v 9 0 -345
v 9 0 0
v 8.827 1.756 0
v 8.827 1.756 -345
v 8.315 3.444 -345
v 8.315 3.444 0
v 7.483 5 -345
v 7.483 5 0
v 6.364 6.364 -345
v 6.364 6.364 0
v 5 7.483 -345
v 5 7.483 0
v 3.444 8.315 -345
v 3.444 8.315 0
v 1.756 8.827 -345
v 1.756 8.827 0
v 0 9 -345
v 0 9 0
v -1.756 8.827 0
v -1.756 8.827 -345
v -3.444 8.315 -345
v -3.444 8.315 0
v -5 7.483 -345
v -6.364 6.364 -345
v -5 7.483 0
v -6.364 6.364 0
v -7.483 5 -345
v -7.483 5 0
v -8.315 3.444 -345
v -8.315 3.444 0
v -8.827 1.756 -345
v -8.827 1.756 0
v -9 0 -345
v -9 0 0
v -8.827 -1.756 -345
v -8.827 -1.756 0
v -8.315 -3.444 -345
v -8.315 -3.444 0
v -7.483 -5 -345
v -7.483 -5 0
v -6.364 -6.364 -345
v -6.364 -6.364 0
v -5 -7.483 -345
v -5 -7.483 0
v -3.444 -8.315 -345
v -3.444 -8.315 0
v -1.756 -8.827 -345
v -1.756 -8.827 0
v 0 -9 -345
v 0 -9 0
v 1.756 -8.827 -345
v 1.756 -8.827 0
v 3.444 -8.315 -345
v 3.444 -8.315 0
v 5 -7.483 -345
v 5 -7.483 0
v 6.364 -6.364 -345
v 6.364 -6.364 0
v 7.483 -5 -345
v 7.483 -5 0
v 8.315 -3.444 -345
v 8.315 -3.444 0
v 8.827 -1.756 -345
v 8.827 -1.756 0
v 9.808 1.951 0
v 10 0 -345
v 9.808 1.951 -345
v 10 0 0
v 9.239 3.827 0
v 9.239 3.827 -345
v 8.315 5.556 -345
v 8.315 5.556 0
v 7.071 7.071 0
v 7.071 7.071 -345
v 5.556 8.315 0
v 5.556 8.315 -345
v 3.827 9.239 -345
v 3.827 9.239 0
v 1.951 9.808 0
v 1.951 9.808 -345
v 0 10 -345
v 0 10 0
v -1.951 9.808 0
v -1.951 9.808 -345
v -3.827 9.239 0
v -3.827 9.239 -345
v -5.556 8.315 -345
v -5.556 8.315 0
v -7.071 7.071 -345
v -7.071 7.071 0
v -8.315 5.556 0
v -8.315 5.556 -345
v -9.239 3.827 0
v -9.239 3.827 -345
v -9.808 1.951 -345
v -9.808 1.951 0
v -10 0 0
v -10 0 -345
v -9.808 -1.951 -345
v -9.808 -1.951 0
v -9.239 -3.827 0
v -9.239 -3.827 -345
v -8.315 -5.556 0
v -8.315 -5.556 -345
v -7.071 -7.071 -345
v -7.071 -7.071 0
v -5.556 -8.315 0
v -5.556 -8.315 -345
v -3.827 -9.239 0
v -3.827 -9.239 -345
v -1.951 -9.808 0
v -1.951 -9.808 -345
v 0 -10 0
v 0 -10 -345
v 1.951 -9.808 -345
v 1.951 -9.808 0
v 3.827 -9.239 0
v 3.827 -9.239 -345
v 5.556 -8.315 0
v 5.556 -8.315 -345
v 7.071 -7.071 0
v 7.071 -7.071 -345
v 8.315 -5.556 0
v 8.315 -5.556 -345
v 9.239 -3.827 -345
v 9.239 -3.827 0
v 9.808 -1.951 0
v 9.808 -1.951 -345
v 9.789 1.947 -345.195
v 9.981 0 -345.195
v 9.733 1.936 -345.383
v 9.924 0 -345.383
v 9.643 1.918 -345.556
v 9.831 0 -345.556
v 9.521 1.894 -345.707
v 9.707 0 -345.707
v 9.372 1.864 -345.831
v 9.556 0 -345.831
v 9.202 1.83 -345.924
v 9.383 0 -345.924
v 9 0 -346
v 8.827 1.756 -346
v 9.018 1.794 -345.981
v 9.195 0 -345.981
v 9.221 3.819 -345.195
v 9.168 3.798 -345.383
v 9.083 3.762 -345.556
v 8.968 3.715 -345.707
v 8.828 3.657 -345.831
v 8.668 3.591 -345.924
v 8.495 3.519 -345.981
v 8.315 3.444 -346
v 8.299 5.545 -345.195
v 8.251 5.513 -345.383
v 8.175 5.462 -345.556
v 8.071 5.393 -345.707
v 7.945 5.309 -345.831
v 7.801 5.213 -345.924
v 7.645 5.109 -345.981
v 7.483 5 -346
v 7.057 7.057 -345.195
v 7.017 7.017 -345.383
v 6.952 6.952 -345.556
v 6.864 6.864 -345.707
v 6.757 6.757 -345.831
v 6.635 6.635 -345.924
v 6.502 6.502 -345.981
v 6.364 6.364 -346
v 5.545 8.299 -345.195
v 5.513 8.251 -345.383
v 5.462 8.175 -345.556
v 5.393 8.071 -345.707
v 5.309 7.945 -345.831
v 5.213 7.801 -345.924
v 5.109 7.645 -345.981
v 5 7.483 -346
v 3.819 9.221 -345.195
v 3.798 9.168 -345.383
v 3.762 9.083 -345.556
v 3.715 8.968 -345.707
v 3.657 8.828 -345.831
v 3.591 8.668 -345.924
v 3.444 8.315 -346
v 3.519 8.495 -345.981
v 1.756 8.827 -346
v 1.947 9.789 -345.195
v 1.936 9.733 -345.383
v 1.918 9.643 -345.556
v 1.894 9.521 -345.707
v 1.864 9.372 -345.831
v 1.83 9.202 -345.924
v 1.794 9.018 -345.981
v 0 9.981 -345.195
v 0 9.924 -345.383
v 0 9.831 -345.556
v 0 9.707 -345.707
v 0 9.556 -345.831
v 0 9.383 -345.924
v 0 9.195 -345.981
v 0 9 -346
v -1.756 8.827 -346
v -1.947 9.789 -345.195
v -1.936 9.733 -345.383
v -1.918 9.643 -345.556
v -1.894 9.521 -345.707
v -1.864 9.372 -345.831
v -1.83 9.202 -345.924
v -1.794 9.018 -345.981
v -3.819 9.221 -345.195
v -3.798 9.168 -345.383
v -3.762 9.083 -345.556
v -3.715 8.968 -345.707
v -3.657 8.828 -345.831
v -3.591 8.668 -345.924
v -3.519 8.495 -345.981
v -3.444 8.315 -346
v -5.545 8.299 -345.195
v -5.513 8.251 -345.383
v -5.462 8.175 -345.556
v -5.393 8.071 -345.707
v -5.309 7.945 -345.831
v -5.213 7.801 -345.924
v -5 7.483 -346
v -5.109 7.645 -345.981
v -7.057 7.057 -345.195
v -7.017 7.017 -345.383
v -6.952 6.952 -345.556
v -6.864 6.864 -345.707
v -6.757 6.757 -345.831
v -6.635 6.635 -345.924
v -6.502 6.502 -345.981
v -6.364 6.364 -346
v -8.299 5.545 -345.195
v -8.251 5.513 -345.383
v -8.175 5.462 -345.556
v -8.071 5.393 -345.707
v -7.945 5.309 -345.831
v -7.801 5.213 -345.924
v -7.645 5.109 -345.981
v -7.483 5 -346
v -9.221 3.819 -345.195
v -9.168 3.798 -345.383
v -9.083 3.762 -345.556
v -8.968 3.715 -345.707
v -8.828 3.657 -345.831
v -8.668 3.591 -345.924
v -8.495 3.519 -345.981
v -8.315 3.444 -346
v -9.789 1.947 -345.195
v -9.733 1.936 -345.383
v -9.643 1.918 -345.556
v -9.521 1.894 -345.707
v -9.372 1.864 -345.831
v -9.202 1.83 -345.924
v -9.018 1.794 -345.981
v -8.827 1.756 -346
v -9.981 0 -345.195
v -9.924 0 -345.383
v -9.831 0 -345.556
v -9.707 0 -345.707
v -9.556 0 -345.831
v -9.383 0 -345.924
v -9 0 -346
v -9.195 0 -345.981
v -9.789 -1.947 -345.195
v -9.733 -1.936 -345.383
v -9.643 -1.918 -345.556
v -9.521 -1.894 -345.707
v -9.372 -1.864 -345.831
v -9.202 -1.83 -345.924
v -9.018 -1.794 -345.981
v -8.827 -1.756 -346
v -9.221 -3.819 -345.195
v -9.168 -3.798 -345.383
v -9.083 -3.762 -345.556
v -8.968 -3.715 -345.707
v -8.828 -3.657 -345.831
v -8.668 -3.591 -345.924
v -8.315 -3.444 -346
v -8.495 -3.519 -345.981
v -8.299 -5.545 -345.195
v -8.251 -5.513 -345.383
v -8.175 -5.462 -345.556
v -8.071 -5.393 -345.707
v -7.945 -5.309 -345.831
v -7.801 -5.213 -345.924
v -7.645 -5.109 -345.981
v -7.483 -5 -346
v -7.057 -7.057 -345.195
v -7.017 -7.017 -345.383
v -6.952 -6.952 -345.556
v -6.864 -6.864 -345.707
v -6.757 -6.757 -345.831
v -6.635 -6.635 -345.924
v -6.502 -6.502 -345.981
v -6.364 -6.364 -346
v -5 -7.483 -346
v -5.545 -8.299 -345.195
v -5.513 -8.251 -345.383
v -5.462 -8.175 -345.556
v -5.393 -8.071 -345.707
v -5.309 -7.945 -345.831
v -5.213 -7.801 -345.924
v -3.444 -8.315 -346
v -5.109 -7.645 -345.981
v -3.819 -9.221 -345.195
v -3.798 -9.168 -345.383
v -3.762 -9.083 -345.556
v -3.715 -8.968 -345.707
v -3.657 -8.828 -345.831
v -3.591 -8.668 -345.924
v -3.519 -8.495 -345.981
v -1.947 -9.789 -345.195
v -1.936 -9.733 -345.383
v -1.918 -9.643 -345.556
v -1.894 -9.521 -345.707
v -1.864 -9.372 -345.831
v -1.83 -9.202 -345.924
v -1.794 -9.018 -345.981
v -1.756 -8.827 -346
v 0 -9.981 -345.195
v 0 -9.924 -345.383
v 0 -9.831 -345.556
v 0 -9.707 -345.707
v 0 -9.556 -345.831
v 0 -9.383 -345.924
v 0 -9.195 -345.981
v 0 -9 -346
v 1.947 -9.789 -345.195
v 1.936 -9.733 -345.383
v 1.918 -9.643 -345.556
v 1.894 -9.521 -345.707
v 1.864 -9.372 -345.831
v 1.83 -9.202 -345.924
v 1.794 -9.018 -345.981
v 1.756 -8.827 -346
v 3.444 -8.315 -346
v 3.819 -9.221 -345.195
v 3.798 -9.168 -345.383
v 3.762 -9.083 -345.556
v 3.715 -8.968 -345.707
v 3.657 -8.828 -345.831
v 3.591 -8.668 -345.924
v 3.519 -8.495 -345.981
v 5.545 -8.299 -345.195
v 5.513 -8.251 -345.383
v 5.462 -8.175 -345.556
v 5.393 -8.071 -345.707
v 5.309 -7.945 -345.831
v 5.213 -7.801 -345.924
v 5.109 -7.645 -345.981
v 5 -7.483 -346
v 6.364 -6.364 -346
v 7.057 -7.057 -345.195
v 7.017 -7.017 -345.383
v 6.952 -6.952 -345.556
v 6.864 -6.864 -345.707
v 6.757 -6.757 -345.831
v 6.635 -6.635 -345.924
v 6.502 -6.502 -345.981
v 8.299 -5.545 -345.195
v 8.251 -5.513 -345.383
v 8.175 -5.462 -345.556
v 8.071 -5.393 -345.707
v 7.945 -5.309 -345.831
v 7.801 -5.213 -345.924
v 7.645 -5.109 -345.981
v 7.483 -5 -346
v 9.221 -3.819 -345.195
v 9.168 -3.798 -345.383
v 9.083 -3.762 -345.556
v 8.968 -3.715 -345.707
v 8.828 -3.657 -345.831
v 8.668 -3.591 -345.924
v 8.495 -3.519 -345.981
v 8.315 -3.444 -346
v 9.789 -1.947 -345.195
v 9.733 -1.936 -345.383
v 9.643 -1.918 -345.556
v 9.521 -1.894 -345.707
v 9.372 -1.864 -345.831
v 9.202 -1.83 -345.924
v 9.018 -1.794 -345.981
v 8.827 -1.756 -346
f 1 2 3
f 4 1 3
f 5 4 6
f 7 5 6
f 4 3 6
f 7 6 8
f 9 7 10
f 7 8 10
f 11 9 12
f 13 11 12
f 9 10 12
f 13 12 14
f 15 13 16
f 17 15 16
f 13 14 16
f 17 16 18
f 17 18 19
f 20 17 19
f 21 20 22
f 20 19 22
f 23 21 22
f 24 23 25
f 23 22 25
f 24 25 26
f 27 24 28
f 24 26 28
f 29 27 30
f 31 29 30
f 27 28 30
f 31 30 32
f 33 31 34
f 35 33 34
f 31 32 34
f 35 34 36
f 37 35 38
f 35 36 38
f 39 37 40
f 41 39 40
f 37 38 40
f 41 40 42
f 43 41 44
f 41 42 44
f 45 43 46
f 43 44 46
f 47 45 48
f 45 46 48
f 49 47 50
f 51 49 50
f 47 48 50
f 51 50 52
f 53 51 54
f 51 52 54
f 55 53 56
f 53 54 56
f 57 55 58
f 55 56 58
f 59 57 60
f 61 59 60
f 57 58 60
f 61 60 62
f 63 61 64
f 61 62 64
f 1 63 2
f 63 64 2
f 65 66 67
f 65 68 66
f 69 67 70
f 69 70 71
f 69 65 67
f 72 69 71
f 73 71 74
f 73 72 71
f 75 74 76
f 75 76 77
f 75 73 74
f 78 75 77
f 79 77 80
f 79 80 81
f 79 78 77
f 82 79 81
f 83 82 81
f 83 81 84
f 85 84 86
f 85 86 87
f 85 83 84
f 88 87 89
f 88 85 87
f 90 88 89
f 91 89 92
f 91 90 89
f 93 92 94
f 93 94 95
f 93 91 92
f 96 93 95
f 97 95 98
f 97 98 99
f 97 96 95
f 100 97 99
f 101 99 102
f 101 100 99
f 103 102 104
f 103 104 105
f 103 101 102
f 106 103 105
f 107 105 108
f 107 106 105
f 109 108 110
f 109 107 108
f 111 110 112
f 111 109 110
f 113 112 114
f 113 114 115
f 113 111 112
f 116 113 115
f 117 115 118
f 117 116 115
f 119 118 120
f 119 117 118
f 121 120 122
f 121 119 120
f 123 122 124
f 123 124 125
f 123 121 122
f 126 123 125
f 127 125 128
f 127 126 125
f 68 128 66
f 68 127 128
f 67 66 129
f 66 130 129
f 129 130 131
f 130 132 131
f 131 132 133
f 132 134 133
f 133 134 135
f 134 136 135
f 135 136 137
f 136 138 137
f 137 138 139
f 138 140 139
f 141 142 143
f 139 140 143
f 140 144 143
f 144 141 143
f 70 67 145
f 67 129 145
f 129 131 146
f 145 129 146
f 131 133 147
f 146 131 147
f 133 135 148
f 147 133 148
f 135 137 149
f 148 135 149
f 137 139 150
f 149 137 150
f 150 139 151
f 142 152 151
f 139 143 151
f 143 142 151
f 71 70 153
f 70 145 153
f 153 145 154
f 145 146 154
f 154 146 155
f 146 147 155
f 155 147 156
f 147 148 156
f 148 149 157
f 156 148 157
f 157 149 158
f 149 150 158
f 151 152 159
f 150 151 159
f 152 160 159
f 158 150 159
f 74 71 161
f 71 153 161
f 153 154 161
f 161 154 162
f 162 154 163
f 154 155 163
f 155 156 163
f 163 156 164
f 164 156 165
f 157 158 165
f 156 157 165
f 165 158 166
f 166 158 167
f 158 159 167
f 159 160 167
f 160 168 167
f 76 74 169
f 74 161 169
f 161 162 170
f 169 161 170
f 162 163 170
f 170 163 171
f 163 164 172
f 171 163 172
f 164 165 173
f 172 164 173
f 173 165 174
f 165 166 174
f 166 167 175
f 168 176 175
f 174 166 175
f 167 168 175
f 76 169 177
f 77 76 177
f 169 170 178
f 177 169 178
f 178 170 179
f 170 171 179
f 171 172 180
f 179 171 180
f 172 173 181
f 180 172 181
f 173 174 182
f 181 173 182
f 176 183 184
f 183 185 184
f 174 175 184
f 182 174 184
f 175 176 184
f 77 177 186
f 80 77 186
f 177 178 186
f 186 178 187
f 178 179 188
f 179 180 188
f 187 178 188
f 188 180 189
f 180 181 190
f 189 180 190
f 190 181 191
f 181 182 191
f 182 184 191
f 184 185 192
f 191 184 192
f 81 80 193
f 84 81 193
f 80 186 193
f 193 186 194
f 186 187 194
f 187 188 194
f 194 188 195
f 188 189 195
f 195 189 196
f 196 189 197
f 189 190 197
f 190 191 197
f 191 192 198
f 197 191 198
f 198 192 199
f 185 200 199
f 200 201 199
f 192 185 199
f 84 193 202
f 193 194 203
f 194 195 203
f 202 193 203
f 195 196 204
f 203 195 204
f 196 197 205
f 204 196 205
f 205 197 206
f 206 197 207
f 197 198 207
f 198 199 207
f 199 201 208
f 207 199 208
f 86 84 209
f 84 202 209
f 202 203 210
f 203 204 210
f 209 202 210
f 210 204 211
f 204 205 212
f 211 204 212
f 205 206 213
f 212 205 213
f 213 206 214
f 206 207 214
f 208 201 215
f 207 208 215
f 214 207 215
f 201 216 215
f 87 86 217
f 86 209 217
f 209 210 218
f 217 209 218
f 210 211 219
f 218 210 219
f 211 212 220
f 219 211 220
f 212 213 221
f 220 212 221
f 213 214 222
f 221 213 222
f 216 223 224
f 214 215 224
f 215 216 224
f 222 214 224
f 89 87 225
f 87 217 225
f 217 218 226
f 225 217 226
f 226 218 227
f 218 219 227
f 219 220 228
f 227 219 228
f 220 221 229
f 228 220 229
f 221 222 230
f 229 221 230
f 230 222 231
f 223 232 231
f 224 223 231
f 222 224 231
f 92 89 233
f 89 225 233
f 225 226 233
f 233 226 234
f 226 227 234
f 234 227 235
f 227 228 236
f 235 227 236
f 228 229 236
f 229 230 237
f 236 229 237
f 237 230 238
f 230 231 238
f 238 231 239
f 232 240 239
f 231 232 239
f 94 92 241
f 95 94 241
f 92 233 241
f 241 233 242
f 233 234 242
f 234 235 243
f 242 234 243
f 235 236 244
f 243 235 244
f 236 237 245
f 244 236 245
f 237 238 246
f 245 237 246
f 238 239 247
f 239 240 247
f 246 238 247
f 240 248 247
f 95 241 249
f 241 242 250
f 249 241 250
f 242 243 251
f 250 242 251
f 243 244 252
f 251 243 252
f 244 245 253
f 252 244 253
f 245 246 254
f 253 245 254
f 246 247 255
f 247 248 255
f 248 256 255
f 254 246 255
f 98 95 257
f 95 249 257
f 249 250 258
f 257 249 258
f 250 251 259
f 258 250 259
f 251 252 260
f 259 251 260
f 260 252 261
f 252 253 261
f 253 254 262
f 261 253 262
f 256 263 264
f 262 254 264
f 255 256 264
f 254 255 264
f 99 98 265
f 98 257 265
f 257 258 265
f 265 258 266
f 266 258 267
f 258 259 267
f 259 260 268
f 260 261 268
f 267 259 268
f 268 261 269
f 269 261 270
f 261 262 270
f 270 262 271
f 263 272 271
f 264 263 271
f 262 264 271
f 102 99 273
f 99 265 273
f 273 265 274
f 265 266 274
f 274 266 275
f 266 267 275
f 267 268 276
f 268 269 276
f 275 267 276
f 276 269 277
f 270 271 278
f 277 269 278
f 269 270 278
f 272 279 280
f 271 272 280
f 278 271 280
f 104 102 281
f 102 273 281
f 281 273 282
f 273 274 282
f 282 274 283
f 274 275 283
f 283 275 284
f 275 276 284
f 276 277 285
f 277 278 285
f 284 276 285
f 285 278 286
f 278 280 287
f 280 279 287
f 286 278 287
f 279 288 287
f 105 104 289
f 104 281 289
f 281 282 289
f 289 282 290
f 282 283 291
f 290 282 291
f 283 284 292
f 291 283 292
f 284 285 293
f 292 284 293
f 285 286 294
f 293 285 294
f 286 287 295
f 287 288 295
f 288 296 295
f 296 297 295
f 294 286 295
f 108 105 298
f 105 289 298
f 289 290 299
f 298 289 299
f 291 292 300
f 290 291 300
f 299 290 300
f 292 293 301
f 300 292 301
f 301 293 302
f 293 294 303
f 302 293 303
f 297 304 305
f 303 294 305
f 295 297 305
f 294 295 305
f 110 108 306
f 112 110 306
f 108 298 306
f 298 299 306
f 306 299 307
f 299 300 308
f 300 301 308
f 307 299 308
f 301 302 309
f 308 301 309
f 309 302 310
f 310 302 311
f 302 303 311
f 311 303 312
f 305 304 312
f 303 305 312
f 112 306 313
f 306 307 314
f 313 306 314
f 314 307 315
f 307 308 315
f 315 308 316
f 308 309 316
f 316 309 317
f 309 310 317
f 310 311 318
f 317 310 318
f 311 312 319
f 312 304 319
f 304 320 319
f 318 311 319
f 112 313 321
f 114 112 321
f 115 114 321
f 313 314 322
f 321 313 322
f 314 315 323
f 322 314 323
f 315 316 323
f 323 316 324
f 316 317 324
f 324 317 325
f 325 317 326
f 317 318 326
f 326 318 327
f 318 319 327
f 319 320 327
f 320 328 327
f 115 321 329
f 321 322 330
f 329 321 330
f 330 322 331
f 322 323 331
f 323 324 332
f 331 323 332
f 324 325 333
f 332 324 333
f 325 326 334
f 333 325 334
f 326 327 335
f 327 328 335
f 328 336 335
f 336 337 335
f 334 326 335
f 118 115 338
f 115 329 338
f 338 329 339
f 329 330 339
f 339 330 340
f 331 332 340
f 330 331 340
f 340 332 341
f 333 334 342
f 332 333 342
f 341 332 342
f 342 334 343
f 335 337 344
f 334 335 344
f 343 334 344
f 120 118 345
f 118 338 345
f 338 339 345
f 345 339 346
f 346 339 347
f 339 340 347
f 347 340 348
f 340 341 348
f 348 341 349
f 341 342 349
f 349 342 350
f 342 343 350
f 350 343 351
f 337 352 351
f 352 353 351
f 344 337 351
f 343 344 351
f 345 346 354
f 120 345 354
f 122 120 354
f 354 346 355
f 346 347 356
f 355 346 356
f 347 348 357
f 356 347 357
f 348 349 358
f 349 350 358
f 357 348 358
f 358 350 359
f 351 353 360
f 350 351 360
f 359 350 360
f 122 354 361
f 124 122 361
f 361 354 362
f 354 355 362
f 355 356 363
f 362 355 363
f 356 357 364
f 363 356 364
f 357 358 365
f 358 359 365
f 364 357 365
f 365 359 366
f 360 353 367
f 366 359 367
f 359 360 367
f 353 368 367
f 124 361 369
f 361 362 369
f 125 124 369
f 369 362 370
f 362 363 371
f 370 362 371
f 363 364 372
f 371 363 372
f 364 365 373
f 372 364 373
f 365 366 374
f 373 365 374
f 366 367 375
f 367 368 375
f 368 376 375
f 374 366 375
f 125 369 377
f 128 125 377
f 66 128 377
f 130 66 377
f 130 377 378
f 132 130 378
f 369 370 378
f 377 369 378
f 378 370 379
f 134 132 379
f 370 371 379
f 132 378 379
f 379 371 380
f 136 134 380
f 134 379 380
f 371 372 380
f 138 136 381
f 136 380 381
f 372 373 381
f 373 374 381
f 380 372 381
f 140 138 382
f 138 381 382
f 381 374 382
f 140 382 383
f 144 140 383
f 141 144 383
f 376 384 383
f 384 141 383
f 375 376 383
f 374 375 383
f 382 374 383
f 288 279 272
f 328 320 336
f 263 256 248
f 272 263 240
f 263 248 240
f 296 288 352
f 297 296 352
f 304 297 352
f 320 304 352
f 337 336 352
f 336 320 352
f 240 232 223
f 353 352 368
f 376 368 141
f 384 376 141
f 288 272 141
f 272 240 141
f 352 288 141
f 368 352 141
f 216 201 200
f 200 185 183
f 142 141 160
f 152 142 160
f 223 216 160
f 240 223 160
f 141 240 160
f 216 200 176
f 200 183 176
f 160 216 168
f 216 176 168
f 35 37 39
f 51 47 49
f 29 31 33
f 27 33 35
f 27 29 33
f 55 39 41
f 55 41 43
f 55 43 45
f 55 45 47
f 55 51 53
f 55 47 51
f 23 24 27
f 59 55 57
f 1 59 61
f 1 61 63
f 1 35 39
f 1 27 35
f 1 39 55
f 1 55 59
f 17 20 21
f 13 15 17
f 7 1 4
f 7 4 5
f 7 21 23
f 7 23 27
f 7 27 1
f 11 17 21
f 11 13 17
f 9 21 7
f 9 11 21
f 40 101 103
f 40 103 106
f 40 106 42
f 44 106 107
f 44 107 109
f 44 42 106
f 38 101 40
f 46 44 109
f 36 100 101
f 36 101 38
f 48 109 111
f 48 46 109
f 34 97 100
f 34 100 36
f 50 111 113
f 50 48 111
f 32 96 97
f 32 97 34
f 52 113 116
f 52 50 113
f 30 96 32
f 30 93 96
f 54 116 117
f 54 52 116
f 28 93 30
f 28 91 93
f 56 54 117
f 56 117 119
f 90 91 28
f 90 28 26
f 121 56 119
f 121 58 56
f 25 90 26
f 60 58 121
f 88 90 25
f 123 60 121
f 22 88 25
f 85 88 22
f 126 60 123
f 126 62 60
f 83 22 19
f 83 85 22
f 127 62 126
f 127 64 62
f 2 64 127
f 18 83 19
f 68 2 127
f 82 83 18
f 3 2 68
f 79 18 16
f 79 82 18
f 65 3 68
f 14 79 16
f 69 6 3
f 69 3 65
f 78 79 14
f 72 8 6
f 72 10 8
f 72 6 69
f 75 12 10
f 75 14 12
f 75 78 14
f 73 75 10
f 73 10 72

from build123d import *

# Parameters (mm, degrees)
F0_R     = 9
F1_DEPTH = 345
F2_T     = 1


# Not quite as in the source:
# - a fillet or chamfer that OpenCascade refuses, or shapes differently, is made with other operations: its cross-section is extruded or revolved along the edge and cut away or added


with BuildPart() as f1:
    # F0 (on Top) → F1 (new body)
    with BuildSketch(Plane.XY):
        Circle(F0_R)
    extrude(amount=-F1_DEPTH)

    # F2
    f2_openings = [f1.faces().sort_by_distance(p)[0] for p in [
        (0, 0, 0),
    ]]
    offset(amount=F2_T, openings=f2_openings, kind=Kind.INTERSECTION)

    # F3: fillet of radius 1 on 1 edges, made by hand

    # F3_s1 → F3_t2 (revolve, cut)
    with BuildSketch(Plane.XZ):
        with BuildLine():
            ThreePointArc((10, -345), (9.7071067812, -345.7071067812), (9, -346))
            Line((9, -346), (10, -346))
            Line((10, -346), (10, -345))
        make_face()
    revolve(axis=Axis((0, 0, -346), (0, 0, 1)), mode=Mode.SUBTRACT)


solid = f1.part
